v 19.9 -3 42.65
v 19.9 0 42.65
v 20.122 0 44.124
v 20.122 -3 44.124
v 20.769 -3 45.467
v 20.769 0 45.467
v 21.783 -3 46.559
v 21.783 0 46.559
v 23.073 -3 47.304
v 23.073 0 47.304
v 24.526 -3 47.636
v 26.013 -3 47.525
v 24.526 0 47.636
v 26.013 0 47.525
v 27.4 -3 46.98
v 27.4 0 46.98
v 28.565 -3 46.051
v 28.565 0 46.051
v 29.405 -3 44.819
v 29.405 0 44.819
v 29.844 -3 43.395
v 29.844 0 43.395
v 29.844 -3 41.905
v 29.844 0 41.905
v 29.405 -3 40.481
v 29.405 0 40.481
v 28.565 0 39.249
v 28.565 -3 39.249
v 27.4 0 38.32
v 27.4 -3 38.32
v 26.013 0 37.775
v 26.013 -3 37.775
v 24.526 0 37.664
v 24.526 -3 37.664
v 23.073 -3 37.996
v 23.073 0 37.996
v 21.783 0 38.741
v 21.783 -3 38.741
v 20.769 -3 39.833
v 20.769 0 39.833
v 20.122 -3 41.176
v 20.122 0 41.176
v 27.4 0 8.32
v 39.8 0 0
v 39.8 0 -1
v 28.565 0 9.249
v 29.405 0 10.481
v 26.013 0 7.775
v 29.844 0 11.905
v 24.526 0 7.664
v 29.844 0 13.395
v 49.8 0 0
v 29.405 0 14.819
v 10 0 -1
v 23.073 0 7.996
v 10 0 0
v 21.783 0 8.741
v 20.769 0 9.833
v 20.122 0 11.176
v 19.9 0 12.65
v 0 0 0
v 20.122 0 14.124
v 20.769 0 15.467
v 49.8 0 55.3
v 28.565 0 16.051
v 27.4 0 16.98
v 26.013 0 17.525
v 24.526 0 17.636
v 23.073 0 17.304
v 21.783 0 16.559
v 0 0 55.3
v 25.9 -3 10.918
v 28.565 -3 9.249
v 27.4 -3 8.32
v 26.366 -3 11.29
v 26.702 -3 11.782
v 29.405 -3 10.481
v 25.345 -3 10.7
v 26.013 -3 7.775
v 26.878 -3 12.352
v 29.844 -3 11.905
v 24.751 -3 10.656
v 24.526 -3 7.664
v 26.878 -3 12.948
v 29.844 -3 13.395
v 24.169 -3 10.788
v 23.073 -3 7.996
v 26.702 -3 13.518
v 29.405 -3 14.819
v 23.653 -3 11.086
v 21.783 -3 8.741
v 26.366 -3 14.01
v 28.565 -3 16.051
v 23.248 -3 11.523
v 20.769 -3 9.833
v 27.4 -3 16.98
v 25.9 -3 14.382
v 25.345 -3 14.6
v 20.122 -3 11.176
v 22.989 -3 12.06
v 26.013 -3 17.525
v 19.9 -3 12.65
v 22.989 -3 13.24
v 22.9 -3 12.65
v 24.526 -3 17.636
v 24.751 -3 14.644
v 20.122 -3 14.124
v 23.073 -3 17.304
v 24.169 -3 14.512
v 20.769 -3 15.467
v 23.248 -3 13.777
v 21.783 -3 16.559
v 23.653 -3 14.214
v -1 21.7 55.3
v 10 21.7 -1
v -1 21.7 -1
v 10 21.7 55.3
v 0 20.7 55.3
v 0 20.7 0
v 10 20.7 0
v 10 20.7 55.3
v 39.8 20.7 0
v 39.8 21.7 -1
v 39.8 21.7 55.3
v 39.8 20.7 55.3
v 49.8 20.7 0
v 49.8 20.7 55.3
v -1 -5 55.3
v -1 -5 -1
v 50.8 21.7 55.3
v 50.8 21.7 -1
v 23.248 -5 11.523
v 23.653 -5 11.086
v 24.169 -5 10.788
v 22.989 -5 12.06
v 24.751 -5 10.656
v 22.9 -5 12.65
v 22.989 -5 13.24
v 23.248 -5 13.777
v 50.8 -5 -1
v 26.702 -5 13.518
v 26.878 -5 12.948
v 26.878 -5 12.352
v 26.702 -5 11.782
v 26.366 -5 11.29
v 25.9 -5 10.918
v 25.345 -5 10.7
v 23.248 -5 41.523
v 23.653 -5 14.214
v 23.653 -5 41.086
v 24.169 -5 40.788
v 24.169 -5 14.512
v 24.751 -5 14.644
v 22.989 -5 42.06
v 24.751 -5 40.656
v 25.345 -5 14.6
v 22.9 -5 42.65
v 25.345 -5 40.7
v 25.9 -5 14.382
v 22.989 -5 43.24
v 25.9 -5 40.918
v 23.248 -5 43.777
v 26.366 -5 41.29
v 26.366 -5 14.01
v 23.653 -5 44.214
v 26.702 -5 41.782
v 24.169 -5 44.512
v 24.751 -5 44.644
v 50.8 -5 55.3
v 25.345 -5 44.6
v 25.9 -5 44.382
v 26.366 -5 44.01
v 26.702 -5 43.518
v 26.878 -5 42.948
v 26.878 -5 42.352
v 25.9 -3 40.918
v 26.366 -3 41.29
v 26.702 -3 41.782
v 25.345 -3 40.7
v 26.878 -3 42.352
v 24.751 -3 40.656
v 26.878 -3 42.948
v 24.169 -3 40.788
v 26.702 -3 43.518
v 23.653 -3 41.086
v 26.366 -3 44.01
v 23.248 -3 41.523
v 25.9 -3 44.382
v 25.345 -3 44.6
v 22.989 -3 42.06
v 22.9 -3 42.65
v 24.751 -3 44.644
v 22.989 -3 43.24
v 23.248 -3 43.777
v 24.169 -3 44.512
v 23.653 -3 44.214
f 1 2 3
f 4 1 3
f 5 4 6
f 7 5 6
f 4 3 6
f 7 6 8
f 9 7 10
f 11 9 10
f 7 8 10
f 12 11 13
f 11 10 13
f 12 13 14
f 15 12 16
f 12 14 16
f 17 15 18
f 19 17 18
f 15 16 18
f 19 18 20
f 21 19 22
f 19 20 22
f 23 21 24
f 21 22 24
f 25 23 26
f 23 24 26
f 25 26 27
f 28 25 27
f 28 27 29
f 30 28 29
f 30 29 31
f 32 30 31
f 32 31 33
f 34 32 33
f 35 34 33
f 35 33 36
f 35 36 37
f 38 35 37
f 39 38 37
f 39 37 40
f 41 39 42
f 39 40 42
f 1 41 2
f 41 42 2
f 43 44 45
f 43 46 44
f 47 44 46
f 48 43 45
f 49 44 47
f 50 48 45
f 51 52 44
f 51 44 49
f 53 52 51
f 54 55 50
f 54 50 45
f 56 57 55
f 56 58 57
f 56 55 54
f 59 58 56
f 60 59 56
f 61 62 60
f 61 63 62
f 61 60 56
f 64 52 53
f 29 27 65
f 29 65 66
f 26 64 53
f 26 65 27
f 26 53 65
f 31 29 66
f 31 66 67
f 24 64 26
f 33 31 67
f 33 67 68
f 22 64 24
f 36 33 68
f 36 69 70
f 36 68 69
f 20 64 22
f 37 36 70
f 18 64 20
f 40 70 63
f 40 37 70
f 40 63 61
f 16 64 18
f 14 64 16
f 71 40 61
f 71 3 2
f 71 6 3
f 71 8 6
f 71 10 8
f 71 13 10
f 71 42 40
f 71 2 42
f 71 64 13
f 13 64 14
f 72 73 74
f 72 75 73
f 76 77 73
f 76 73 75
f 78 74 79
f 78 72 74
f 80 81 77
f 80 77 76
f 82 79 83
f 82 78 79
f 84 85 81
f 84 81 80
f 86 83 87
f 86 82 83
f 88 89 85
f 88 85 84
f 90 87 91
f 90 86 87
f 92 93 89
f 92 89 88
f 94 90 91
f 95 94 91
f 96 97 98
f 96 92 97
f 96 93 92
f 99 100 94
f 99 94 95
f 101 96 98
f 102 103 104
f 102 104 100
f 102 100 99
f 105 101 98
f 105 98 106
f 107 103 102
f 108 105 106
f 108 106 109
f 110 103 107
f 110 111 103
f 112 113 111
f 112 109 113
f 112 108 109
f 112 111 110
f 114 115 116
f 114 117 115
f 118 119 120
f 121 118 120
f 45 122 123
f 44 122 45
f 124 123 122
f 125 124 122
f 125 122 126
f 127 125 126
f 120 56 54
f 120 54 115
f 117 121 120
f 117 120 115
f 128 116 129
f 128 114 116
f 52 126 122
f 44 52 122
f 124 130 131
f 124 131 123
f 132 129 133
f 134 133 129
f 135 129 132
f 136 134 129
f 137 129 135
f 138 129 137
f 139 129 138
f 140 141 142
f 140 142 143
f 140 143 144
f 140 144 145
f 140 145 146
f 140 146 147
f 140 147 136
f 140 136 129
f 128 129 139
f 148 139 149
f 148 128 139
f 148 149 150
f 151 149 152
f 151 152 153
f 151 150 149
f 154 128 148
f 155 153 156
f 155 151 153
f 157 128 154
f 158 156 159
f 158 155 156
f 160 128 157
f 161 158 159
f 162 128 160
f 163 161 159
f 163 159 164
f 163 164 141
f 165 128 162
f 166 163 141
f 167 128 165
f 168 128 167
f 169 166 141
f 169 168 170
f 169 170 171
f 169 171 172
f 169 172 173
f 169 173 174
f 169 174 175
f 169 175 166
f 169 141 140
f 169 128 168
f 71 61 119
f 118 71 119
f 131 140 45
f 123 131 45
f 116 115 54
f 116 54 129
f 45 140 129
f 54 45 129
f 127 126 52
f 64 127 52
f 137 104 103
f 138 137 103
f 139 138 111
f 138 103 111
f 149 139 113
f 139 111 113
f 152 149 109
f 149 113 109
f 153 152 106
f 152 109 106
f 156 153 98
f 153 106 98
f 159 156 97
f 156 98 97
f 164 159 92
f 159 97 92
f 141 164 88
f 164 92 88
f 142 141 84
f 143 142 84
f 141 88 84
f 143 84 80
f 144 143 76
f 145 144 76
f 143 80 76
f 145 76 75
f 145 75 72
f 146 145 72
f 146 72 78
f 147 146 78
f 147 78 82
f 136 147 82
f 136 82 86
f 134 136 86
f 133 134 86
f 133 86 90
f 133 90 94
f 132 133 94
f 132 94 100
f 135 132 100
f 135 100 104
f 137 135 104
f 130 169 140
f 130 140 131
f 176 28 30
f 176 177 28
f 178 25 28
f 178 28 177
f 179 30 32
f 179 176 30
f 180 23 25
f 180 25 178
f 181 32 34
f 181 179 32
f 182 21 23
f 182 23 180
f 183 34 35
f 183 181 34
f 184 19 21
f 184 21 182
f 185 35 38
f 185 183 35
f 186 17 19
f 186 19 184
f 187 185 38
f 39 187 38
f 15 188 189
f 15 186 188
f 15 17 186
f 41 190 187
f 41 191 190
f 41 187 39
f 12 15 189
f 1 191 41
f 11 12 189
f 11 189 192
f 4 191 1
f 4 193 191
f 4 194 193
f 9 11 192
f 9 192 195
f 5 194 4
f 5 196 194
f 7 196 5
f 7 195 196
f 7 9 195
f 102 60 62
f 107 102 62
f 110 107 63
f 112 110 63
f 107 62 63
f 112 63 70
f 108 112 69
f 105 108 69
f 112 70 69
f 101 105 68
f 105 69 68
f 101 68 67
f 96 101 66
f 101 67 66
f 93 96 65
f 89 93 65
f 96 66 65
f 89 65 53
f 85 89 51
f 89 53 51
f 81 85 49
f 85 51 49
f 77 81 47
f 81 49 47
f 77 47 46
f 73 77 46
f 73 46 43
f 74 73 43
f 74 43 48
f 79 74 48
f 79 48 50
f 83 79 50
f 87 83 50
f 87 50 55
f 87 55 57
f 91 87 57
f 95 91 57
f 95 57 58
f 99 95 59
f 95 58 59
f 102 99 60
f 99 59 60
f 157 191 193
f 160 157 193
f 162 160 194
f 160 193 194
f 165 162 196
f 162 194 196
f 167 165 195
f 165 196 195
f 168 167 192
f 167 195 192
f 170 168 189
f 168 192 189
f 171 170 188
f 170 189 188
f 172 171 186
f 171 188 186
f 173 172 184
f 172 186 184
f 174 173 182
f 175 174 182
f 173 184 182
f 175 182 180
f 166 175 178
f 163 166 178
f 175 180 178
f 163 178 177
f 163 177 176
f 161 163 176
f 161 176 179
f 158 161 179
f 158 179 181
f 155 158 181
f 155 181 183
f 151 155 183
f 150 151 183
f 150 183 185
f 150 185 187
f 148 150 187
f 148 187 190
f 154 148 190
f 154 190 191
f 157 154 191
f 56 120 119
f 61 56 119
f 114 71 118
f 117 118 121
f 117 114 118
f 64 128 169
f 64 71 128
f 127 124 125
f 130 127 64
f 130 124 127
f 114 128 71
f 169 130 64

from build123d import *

# Parameters (mm, degrees)
PAD_DEPTH    = 55.3
PAD001_DEPTH = 1
SKETCH002_R  = 2
HOLE_DEPTH   = 25
SKETCH003_R  = 5
POCKET_DEPTH = 3


with BuildPart() as part:
    # Sketch → Pad (new body)
    with BuildSketch(Plane.XY):
        Polygon((0, 0), (0, 20.7), (10, 20.7), (10, 21.7), (-1, 21.7), (-1, -5), (50.8, -5), (50.8, 21.7), (39.8, 21.7), (39.8, 20.7), (49.8, 20.7), (49.8, 0), align=None)
    extrude(amount=PAD_DEPTH)

    # Sketch001 (on Face13 of Pad) → Pad001 (join)
    with BuildSketch(Plane(origin=(0, 0, 0), x_dir=(1, 0, 0), z_dir=(0, 0, -1))):
        Polygon((-1, 5), (50.8, 5), (50.8, -21.7), (39.8, -21.7), (39.8, 0), (10, 0), (10, -21.7), (-1, -21.7), align=None)
    extrude(amount=PAD001_DEPTH)

    # Sketch002 (on Face14 of Pad001) → Hole (cut)
    with BuildSketch(Plane(origin=(0, 0, 0), x_dir=(-1, 0, 0), z_dir=(0, 1, 0))):
        with Locations((-24.9, 42.65)):
            Circle(SKETCH002_R)
        with Locations((-24.9, 12.65)):
            Circle(SKETCH002_R)
    extrude(amount=-HOLE_DEPTH, mode=Mode.SUBTRACT)

    # Sketch003 (on Face14 of Pad001) → Pocket (cut)
    with BuildSketch(Plane(origin=(0, 0, 0), x_dir=(-1, 0, 0), z_dir=(0, 1, 0))):
        with Locations((-24.9, 42.65)):
            Circle(SKETCH003_R)
        with Locations((-24.9, 12.65)):
            Circle(SKETCH003_R)
    extrude(amount=-POCKET_DEPTH, mode=Mode.SUBTRACT)


solid = part.part
